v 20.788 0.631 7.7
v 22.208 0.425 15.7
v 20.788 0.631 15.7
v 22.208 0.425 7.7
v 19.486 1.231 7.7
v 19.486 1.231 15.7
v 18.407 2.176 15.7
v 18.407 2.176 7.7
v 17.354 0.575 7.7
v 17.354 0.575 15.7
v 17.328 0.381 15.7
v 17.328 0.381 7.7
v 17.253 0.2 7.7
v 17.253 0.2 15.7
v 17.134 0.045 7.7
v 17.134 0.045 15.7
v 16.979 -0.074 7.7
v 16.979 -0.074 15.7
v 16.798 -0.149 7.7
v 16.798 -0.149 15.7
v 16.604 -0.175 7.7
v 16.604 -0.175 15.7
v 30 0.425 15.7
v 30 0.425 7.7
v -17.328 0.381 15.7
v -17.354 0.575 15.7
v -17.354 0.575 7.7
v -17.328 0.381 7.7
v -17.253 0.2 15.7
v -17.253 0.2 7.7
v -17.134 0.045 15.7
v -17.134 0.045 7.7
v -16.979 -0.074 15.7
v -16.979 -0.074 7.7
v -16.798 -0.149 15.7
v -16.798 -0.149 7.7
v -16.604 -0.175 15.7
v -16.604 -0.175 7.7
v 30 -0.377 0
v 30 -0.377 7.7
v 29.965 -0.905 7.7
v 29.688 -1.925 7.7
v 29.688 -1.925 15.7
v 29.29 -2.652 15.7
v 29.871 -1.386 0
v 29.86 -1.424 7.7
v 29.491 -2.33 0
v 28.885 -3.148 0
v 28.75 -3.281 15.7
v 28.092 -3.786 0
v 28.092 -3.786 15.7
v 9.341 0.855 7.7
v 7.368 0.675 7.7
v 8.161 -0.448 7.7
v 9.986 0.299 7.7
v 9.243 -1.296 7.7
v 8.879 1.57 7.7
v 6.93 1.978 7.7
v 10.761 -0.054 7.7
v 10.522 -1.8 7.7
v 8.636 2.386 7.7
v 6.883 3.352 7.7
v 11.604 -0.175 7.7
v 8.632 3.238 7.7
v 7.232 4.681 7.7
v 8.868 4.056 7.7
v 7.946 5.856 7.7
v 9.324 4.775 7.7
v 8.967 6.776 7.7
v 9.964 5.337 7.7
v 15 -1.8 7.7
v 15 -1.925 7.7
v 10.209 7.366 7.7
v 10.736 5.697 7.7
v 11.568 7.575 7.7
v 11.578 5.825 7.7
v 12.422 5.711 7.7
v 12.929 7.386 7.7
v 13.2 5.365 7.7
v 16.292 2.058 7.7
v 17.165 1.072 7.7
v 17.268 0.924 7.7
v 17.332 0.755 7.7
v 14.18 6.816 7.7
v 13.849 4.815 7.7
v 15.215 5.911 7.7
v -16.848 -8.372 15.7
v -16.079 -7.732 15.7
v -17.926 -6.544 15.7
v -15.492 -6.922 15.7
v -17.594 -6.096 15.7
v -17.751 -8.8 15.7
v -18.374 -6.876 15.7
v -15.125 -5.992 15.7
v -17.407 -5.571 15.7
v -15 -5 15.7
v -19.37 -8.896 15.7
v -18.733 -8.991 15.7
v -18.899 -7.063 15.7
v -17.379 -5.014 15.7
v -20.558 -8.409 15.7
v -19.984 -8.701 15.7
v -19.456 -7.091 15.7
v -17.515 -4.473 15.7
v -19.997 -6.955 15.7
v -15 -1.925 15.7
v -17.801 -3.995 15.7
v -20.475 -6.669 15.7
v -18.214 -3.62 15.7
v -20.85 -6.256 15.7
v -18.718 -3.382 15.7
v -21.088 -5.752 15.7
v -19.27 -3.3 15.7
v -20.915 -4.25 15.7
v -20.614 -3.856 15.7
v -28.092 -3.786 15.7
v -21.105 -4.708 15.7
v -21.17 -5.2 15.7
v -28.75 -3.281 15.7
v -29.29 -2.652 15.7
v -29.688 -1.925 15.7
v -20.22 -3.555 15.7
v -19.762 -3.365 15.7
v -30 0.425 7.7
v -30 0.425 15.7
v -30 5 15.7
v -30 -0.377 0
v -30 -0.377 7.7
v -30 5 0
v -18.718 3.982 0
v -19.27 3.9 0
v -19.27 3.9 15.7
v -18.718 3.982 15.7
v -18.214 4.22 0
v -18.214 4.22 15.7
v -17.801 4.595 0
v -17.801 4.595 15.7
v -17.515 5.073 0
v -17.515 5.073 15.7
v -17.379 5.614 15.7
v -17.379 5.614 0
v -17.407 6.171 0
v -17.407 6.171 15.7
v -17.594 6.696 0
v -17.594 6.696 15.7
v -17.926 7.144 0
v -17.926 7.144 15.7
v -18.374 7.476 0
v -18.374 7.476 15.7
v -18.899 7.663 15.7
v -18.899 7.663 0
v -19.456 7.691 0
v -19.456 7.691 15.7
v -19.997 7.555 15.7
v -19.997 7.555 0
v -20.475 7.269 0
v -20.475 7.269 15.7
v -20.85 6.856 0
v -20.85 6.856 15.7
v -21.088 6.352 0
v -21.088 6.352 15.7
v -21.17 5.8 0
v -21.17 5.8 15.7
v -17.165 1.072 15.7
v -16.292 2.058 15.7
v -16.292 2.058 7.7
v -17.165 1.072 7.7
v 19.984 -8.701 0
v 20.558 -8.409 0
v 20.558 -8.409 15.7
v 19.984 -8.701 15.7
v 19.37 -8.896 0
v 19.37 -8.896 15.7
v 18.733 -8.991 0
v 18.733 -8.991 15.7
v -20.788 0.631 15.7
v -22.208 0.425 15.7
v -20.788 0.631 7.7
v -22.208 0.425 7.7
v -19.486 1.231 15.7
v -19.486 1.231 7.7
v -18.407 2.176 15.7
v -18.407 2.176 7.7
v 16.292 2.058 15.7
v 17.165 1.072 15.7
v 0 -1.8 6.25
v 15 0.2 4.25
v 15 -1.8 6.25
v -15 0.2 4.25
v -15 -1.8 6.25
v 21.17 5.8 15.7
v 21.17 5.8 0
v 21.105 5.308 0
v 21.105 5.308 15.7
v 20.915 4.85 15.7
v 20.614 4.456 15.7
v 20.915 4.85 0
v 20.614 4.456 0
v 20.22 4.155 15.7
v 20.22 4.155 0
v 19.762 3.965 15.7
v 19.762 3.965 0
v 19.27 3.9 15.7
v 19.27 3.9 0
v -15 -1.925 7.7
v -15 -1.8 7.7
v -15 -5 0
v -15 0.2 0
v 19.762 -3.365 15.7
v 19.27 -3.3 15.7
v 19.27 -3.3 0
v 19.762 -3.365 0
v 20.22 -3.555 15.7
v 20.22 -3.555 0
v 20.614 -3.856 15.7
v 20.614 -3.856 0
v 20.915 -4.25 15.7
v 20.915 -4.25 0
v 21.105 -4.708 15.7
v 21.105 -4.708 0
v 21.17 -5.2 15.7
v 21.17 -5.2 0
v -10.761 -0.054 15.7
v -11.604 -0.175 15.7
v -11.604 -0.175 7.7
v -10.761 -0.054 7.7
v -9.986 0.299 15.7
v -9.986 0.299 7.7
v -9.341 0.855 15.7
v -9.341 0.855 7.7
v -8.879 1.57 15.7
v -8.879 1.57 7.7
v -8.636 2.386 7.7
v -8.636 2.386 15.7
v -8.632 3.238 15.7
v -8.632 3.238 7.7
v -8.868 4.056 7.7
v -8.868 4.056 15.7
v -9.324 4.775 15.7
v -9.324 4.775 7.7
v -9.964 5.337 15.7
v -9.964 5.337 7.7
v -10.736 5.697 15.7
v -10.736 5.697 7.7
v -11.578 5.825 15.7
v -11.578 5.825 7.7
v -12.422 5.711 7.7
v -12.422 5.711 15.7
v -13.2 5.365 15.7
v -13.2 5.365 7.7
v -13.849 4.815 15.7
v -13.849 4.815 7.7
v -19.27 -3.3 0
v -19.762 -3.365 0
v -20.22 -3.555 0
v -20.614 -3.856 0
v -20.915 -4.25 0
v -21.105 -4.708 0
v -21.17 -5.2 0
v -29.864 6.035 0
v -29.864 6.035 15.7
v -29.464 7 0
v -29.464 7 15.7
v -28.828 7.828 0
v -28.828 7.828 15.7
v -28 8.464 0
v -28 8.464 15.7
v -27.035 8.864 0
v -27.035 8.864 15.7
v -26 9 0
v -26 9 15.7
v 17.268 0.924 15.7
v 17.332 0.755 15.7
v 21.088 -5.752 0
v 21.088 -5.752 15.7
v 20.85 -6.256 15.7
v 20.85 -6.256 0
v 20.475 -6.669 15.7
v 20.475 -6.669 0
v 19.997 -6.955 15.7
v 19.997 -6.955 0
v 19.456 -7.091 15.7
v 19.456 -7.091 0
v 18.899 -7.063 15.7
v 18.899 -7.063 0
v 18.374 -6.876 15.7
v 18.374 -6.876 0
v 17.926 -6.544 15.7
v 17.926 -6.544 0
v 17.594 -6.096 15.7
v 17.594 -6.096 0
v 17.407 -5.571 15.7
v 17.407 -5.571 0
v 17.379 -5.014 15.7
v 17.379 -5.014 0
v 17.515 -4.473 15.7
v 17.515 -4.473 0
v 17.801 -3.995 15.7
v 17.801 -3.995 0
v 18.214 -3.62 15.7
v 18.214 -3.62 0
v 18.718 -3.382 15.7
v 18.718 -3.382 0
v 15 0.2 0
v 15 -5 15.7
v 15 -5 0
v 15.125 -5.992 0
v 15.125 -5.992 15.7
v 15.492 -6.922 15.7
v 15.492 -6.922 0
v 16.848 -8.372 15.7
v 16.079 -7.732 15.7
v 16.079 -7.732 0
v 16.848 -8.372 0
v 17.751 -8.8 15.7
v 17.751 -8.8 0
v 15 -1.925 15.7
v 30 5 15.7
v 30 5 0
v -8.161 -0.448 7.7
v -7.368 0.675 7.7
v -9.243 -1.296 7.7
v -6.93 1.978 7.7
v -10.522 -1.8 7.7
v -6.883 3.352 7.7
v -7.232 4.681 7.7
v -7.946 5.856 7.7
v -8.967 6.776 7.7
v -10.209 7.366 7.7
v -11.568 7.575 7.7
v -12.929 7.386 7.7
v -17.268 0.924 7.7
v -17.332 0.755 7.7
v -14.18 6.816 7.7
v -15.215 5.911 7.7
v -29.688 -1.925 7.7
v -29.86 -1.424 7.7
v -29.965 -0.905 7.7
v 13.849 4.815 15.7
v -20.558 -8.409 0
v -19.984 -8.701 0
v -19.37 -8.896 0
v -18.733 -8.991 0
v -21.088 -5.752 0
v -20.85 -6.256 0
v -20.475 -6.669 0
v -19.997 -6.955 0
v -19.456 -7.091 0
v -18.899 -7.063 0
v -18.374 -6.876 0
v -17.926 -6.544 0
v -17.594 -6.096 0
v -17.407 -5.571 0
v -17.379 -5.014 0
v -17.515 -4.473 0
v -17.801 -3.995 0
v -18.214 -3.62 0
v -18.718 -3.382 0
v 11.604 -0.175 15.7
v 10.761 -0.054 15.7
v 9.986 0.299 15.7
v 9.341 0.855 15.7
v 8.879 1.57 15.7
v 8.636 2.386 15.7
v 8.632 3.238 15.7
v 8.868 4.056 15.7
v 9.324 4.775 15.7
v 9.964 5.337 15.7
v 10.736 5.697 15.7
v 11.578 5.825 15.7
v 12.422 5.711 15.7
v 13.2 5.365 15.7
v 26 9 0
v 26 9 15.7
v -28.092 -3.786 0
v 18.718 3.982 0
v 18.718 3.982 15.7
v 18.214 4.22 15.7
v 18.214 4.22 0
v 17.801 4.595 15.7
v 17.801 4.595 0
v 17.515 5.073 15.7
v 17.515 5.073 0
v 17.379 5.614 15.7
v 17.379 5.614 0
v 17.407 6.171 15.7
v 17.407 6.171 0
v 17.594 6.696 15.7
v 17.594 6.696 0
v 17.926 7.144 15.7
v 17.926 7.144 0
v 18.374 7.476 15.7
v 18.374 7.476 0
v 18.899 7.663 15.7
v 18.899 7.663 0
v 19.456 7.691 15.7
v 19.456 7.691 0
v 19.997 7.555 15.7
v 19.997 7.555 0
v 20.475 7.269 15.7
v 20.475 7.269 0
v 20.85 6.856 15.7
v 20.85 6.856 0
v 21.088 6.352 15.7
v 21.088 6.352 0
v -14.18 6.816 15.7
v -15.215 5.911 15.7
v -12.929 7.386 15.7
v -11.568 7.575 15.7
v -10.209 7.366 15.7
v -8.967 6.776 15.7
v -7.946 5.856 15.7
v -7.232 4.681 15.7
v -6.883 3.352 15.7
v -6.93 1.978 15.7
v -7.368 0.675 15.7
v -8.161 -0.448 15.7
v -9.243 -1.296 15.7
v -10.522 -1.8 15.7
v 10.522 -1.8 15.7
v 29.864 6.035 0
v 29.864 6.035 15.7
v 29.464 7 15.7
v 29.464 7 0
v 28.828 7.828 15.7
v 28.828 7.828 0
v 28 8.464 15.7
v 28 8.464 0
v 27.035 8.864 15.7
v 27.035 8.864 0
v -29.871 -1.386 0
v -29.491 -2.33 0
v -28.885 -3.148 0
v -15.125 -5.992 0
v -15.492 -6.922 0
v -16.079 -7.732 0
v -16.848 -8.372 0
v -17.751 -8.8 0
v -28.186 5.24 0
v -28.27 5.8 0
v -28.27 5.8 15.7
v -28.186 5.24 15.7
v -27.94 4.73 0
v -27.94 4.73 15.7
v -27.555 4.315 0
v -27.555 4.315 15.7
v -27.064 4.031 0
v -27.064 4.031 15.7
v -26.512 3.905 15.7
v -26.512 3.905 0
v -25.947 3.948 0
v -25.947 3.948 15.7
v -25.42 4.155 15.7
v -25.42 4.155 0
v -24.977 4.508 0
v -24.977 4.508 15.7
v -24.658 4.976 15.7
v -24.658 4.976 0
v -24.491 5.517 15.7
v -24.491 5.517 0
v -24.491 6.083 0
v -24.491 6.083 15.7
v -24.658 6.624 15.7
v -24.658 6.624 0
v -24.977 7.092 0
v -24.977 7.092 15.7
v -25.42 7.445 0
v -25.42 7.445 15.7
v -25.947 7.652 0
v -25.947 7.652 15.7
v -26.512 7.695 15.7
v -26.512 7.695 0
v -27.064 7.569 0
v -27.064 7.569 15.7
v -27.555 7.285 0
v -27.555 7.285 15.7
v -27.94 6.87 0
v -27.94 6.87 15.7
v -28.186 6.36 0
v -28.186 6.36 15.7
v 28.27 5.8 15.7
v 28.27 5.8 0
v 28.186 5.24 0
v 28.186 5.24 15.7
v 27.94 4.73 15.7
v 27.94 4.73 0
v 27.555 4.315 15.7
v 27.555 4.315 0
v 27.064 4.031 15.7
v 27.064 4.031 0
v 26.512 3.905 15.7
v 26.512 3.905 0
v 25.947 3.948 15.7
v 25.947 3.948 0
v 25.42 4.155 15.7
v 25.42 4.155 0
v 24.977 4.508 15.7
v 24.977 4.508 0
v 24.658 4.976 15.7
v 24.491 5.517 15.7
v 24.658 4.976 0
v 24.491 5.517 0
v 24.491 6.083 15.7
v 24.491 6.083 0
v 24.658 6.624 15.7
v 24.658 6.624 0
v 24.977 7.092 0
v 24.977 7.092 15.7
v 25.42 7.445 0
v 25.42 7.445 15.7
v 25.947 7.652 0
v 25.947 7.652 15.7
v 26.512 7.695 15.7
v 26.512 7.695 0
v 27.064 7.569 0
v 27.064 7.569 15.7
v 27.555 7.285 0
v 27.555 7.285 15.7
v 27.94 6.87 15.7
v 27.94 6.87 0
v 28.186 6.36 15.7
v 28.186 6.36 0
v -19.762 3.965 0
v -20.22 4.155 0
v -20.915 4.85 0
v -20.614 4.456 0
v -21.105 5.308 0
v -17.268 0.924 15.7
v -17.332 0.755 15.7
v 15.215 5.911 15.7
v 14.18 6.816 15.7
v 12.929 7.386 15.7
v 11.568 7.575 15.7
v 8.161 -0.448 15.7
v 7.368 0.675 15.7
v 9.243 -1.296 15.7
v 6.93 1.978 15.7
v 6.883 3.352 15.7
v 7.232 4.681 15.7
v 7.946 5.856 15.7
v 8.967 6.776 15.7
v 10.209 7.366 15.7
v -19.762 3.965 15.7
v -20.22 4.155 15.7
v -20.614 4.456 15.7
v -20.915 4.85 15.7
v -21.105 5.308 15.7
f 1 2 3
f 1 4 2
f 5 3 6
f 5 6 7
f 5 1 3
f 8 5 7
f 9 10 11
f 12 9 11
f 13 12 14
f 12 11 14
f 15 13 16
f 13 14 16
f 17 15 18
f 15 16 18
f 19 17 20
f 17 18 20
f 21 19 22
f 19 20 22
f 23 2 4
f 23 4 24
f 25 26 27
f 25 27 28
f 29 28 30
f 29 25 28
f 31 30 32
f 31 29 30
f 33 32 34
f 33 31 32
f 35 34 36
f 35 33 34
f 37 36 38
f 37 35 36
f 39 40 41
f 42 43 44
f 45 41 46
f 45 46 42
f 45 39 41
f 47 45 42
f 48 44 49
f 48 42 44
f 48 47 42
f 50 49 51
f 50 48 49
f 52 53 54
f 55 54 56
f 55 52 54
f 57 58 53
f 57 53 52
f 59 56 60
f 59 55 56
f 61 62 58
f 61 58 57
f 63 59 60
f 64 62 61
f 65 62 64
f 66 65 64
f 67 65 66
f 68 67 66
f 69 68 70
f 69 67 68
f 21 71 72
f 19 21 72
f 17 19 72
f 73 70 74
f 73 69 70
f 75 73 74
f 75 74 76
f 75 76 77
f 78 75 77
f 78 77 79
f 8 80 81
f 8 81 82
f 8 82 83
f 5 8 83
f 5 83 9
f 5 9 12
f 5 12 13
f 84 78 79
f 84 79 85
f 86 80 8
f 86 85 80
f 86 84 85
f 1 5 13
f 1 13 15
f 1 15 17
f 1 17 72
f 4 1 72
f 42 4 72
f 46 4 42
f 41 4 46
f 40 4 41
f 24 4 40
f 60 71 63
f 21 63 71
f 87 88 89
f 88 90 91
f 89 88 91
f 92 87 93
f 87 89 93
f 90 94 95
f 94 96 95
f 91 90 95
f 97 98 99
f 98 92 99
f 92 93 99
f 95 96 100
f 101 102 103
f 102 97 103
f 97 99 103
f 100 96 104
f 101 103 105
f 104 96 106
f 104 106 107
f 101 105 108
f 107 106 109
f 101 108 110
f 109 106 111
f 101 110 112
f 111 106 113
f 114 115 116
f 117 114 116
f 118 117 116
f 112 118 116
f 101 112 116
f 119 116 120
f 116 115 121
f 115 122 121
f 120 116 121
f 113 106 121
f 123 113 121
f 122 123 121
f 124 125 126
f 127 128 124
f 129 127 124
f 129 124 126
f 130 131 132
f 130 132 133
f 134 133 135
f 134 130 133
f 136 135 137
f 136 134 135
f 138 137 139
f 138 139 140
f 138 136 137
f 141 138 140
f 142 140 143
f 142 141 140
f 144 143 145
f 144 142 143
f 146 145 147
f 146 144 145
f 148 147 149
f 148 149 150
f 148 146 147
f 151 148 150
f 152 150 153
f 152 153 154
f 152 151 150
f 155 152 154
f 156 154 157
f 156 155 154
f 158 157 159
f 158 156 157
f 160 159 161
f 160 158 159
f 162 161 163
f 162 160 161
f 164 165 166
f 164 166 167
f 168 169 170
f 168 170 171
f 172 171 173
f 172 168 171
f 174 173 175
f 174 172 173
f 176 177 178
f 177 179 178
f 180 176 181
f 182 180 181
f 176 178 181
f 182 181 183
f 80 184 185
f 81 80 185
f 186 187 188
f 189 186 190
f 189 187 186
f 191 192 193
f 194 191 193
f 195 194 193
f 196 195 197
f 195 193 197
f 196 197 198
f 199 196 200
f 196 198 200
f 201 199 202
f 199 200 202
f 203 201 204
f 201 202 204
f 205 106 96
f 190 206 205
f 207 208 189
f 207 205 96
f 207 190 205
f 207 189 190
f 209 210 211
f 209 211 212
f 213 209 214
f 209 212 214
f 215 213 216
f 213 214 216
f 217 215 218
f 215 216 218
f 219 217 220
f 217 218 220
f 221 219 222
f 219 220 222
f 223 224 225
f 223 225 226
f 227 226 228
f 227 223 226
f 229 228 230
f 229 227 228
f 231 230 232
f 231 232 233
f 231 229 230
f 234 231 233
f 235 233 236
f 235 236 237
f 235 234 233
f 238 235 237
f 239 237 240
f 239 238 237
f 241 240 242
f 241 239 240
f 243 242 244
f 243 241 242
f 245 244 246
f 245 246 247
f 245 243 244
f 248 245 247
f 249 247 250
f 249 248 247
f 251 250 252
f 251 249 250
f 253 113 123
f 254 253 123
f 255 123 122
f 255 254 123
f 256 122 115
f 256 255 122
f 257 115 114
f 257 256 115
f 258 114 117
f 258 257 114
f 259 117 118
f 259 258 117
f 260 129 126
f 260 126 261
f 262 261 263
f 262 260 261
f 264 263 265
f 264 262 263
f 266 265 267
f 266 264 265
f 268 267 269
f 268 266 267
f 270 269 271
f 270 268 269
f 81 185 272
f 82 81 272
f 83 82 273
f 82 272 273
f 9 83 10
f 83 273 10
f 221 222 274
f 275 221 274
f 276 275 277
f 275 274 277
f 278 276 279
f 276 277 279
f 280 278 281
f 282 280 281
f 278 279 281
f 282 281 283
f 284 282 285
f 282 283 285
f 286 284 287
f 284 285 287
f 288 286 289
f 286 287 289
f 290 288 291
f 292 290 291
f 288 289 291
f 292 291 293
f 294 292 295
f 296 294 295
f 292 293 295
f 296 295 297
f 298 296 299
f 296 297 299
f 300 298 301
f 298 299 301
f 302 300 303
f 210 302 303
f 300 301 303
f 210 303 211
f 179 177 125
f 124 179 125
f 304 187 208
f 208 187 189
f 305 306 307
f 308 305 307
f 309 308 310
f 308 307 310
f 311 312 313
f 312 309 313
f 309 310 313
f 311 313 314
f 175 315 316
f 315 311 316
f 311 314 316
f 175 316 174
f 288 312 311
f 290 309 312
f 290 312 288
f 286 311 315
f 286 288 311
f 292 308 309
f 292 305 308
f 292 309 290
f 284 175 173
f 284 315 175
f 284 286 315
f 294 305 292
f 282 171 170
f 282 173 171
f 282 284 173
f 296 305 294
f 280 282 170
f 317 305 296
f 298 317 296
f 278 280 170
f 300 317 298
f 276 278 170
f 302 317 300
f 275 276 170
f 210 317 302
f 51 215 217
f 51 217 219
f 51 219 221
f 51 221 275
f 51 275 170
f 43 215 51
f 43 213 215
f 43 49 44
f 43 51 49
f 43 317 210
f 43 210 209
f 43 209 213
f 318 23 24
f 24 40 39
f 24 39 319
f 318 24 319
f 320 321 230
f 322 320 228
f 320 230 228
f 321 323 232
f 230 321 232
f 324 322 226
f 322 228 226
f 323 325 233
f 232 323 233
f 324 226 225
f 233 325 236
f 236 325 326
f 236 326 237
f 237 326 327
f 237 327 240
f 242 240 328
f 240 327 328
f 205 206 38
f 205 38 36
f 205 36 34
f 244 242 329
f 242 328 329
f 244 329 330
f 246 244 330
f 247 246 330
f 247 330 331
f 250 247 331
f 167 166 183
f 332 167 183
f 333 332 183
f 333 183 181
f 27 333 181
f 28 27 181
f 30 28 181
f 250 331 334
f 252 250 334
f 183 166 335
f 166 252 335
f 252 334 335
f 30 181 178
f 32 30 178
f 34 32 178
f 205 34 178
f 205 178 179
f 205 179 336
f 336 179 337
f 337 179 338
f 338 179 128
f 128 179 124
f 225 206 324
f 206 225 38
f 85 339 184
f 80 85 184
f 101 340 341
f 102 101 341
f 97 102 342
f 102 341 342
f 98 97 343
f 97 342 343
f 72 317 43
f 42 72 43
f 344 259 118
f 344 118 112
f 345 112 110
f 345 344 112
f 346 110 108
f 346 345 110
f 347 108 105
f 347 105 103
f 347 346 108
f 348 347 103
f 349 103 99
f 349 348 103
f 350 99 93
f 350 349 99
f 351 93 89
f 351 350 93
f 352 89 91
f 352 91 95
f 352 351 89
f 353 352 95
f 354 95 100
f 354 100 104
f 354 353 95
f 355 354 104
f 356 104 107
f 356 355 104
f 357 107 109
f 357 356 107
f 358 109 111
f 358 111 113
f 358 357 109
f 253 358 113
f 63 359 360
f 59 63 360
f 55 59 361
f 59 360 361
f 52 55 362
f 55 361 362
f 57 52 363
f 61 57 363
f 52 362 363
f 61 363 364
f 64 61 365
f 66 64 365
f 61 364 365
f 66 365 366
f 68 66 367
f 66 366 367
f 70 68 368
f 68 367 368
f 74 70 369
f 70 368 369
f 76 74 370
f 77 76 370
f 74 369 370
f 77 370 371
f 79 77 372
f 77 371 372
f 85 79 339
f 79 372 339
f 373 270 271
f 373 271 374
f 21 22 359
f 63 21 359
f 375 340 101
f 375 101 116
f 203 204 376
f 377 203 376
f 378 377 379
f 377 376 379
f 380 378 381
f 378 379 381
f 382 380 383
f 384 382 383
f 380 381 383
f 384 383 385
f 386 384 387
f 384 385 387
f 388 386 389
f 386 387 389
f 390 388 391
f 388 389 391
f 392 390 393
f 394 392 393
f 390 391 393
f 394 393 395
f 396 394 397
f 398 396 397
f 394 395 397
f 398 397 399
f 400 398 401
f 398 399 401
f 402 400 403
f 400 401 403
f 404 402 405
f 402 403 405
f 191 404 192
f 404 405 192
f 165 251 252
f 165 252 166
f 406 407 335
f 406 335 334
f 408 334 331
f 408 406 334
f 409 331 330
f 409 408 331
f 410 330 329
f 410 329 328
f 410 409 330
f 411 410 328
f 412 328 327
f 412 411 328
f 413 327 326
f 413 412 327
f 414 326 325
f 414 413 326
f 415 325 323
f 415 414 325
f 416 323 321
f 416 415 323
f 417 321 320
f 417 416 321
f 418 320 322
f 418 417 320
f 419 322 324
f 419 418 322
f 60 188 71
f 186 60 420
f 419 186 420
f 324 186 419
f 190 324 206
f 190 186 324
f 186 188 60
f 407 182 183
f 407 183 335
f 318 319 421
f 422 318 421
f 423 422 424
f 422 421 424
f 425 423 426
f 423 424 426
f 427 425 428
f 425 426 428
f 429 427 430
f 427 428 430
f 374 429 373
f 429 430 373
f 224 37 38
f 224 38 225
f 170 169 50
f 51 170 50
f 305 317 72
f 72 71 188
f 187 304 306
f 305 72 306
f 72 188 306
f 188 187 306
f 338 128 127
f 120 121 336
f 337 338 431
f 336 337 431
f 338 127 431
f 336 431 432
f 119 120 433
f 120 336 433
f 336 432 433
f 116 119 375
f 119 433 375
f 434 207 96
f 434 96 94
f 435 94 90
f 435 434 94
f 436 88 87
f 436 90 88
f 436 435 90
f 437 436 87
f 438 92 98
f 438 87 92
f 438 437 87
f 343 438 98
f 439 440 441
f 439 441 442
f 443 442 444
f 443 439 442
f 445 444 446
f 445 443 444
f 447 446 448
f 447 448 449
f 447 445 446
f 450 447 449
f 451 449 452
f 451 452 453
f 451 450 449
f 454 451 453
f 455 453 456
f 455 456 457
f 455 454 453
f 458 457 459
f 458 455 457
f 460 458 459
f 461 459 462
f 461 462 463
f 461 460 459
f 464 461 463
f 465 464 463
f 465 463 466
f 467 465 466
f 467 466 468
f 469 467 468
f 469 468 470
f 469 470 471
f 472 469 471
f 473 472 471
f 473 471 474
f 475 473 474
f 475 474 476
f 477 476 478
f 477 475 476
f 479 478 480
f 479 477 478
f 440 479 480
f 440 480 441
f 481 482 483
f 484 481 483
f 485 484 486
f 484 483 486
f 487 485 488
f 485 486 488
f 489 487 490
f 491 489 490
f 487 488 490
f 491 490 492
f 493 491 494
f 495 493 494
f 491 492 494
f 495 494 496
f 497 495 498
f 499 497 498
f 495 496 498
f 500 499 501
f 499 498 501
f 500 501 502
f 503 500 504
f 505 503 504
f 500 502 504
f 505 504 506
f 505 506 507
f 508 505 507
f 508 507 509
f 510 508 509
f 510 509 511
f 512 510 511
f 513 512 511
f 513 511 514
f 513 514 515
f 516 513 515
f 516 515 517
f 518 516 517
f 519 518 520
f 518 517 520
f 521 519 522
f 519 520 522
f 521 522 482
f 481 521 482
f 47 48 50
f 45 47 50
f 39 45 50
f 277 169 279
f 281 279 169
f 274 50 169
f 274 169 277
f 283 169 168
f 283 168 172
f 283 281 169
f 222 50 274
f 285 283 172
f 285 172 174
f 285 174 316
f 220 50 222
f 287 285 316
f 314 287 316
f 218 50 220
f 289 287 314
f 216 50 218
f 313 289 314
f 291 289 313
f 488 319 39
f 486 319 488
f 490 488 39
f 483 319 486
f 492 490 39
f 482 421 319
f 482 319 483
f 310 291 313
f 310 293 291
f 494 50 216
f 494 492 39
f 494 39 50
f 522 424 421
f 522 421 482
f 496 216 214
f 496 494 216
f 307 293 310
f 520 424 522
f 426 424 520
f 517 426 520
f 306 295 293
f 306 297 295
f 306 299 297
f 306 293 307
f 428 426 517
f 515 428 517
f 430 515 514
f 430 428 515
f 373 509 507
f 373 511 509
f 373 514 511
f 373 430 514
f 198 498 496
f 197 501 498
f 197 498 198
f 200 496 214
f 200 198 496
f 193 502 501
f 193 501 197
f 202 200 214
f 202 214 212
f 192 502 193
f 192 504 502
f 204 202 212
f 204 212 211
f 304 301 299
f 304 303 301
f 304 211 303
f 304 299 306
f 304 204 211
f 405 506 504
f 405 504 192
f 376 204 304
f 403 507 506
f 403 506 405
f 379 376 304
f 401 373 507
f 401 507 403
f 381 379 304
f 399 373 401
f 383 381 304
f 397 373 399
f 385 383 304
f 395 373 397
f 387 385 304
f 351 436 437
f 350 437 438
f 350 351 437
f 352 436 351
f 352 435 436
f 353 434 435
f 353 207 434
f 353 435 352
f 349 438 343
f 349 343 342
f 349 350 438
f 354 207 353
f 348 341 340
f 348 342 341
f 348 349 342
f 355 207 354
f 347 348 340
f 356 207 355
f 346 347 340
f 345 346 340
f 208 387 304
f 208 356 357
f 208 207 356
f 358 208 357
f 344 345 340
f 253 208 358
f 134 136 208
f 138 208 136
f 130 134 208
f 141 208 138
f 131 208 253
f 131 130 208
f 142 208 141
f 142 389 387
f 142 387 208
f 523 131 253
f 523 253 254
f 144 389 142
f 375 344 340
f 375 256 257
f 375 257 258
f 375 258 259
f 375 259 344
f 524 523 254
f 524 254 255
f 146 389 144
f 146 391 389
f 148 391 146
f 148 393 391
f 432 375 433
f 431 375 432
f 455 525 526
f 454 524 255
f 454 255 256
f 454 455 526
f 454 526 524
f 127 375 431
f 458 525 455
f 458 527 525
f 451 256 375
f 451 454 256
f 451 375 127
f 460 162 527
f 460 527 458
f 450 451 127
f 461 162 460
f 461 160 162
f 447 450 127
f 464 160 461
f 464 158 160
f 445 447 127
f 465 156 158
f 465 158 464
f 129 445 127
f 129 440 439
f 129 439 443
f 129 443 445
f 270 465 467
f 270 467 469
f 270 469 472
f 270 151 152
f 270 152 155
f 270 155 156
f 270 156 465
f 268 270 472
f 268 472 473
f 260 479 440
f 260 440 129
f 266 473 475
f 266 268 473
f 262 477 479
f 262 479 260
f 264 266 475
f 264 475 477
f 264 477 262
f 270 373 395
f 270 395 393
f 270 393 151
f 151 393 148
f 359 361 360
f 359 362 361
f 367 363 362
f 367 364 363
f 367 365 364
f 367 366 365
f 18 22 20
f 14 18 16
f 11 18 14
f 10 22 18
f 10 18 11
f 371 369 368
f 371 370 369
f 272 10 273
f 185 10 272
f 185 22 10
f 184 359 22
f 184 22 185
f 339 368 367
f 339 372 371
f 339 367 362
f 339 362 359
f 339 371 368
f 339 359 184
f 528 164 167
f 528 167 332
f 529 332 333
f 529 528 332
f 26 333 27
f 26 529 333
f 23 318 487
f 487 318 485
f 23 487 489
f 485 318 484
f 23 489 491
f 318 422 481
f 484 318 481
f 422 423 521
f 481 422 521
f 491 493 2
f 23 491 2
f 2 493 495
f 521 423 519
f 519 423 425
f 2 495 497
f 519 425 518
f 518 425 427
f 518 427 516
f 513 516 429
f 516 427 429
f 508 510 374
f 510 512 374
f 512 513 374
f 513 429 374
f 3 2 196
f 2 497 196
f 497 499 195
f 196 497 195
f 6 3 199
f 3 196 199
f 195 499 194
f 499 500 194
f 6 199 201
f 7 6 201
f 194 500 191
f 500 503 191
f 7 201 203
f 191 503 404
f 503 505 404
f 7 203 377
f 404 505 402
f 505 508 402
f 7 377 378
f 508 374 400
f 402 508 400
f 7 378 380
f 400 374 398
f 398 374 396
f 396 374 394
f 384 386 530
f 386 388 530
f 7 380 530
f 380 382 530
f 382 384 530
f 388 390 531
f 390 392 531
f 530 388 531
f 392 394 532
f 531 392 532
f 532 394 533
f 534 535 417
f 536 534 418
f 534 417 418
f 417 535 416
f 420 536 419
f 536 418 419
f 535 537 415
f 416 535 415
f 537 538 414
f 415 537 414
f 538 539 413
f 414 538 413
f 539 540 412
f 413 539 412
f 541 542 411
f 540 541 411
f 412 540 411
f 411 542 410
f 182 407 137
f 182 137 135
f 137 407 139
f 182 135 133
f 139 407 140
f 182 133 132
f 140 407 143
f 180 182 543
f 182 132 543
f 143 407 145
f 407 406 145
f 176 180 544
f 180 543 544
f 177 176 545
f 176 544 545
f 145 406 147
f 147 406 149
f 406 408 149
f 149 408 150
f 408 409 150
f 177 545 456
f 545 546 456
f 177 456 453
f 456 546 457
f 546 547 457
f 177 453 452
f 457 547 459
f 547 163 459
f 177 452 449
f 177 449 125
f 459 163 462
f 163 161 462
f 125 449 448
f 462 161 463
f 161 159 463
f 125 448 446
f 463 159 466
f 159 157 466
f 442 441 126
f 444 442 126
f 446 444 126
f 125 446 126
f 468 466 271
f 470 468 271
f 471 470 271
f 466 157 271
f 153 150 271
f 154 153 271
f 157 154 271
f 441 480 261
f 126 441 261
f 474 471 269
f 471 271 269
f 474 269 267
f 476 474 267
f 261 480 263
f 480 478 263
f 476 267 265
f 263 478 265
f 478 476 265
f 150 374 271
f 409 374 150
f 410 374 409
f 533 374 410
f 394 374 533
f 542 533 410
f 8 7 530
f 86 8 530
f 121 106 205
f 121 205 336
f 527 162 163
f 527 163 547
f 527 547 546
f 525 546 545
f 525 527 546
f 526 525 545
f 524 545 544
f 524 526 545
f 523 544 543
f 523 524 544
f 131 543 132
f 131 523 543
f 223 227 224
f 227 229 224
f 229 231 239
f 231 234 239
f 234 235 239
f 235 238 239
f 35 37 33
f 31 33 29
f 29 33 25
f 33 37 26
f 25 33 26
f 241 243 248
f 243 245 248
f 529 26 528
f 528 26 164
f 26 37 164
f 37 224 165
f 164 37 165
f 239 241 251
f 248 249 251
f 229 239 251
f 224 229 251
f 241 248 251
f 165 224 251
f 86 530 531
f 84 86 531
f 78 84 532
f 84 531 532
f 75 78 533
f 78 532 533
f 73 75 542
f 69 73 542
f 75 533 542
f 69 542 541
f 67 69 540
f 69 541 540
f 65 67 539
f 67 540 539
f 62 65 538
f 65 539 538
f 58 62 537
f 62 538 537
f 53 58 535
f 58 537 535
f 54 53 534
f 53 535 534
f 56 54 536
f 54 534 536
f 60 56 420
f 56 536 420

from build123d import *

# Parameters (mm, degrees)
F1_DEPTH    = 15.7
F2_W        = 10.0960650777
F2_H        = 2.35
F3_DEPTH    = 8
F4_R        = 5
F5_T1_DEPTH = 26.8923143391
F5_T3_DEPTH = 21.3473434867
F5_T5_DEPTH = 35.7
F6_W        = 15
F6_H        = 6.25
F7_DEPTH    = 2
F8_SIZE     = 1.99999


# Not quite as in the source:
# - a fillet or chamfer that OpenCascade refuses, or shapes differently, is made with other operations: its cross-section is extruded or revolved along the edge and cut away or added
# - a fillet or chamfer is up to 0.001 mm smaller than in the source, because OpenCascade refuses the exact size


with BuildPart() as f1:
    # F0 (on Top) → F1 (new body)
    with BuildSketch(Plane.XY):
        Polygon((30, 9), (0, 9), (0, -1.8), (15, -1.8), (15, -9), (19.5954625243, -9), (30, -2.6151265483), align=None)
        with BuildLine():
            ThreePointArc((21.17, -5.2), (17.9264971157, -6.5435028843), (19.27, -3.3))
            ThreePointArc((19.27, -3.3), (20.6135028843, -3.8564971157), (21.17, -5.2))
        make_face(mode=Mode.SUBTRACT)
        with BuildLine():
            ThreePointArc((19.27, 3.9), (17.9264971157, 7.1435028843), (21.17, 5.8))
            ThreePointArc((21.17, 5.8), (20.6135028843, 4.4564971157), (19.27, 3.9))
        make_face(mode=Mode.SUBTRACT)
        with BuildLine():
            ThreePointArc((24.47, 5.8), (26.37, 7.7), (28.27, 5.8))
            ThreePointArc((28.27, 5.8), (26.37, 3.9), (24.47, 5.8))
        make_face(mode=Mode.SUBTRACT)
    extrude(amount=F1_DEPTH)

    # F2 (on face) → F3 (cut)
    with BuildSketch(Plane.XY.offset(15.7)):
        with BuildLine():
            ThreePointArc((11.6039349223, -0.1749693412), (8.8681704068, 4.0561246908), (13.8492571677, 4.8146356484))
            Line((13.8492571677, 4.8146356484), (16.291649806, 2.0583304766))
            ThreePointArc((16.291649806, 2.0583304766), (16.3383380366, 2.4404176698), (16.3539349223, 2.8250306588))
            ThreePointArc((16.3539349223, 2.8250306588), (16.0600367861, 4.4699185515), (15.2147112678, 5.9112571869))
            ThreePointArc((15.2147112678, 5.9112571869), (7.5463441808, 5.2945361506), (10.5215341623, -1.8))
            Line((10.5215341623, -1.8), (12.6863356823, -1.8))
            ThreePointArc((12.6863356823, -1.8), (14.1212348386, -1.2030831841), (15.286664888, -0.1749693412))
            Line((15.286664888, -0.1749693412), (11.6039349223, -0.1749693412))
        make_face()
        with BuildLine():
            ThreePointArc((16.3539349223, 2.8250306588), (16.3383380366, 2.4404176698), (16.291649806, 2.0583304766))
            Line((16.291649806, 2.0583304766), (17.1652654837, 1.0724319062))
            ThreePointArc((17.1652654837, 1.0724319062), (17.3051830671, 0.8410213344), (17.3539349223, 0.5750306588))
            ThreePointArc((17.3539349223, 0.5750306588), (17.1342650082, 0.0447005729), (16.6039349223, -0.1749693412))
            Line((16.6039349223, -0.1749693412), (15.286664888, -0.1749693412))
            ThreePointArc((15.286664888, -0.1749693412), (14.1212348386, -1.2030831841), (12.6863356823, -1.8))
            Line((12.6863356823, -1.8), (15, -1.8))
            Line((15, -1.8), (15, -1.9249693412))
            Line((15, -1.9249693412), (19.9039349223, -1.9249693412))
            Line((19.9039349223, -1.9249693412), (19.9039349223, 0.4250306588))
            Line((19.9039349223, 0.4250306588), (15.2147112678, 5.9112571869))
            ThreePointArc((15.2147112678, 5.9112571869), (16.0600367861, 4.4699185515), (16.3539349223, 2.8250306588))
        make_face()
        with Locations((24.9519674612, -0.7499693412)):
            Rectangle(F2_W, F2_H)
    extrude(amount=-F3_DEPTH, mode=Mode.SUBTRACT)

    # F4
    f4_edges = [f1.edges().sort_by_distance(p)[0] for p in [
        (19.903935, 0.425031, 11.7),
    ]]
    fillet(f4_edges, radius=F4_R)

    # F5: fillet of radius 4 on 4 edges, made by hand

    # F5_s2 → F5_t1 (cut)
    with BuildSketch(Plane.XY.offset(-5.5961571696)):
        with BuildLine():
            ThreePointArc((30, -0.3766636805), (29.4905957559, -2.3300559271), (28.0921293656, -3.7859150232))
            Line((28.0921293656, -3.7859150232), (30, -2.6151265483))
            Line((30, -2.6151265483), (30, -0.3766636805))
        make_face()
    extrude(amount=F5_T1_DEPTH, mode=Mode.SUBTRACT)

    # F5_s4 → F5_t3 (cut)
    with BuildSketch(Plane.XY.offset(-2.8236717433)):
        with BuildLine():
            ThreePointArc((20.5581231925, -8.4092513427), (19.5529608525, -8.8494808332), (18.465993827, -9))
            Line((18.465993827, -9), (19.5954625243, -9))
            Line((19.5954625243, -9), (20.5581231925, -8.4092513427))
        make_face()
    extrude(amount=F5_T3_DEPTH, mode=Mode.SUBTRACT)

    # F5_s6 → F5_t5 (cut)
    with BuildSketch(Plane.XY.offset(-10)):
        with BuildLine():
            ThreePointArc((15, -5), (16.1715728753, -7.8284271247), (19, -9))
            Line((19, -9), (15, -9))
            Line((15, -9), (15, -5))
        make_face()
        with BuildLine():
            ThreePointArc((30, 5), (28.8284271247, 7.8284271247), (26, 9))
            Line((26, 9), (30, 9))
            Line((30, 9), (30, 5))
        make_face()
    extrude(amount=F5_T5_DEPTH, mode=Mode.SUBTRACT)

    # F6 (on face) → F7 (cut)
    with BuildSketch(Plane.XZ.offset(1.8)):
        with Locations((7.5, 3.125)):
            Rectangle(F6_W, F6_H)
    extrude(amount=-F7_DEPTH, mode=Mode.SUBTRACT)

    # F8 (size 2 in the source; OpenCascade refuses exactly that, so slightly less here)
    f8_edges = [f1.edges().sort_by_distance(p)[0] for p in [
        (7.5, 0.2, 6.25),
    ]]
    chamfer(f8_edges, length=F8_SIZE)

    # F9: F1 across plane


with BuildPart() as f1_1:
    add(f1.part)
    add(f1.part.mirror(Plane.YZ))


solid = f1_1.part
